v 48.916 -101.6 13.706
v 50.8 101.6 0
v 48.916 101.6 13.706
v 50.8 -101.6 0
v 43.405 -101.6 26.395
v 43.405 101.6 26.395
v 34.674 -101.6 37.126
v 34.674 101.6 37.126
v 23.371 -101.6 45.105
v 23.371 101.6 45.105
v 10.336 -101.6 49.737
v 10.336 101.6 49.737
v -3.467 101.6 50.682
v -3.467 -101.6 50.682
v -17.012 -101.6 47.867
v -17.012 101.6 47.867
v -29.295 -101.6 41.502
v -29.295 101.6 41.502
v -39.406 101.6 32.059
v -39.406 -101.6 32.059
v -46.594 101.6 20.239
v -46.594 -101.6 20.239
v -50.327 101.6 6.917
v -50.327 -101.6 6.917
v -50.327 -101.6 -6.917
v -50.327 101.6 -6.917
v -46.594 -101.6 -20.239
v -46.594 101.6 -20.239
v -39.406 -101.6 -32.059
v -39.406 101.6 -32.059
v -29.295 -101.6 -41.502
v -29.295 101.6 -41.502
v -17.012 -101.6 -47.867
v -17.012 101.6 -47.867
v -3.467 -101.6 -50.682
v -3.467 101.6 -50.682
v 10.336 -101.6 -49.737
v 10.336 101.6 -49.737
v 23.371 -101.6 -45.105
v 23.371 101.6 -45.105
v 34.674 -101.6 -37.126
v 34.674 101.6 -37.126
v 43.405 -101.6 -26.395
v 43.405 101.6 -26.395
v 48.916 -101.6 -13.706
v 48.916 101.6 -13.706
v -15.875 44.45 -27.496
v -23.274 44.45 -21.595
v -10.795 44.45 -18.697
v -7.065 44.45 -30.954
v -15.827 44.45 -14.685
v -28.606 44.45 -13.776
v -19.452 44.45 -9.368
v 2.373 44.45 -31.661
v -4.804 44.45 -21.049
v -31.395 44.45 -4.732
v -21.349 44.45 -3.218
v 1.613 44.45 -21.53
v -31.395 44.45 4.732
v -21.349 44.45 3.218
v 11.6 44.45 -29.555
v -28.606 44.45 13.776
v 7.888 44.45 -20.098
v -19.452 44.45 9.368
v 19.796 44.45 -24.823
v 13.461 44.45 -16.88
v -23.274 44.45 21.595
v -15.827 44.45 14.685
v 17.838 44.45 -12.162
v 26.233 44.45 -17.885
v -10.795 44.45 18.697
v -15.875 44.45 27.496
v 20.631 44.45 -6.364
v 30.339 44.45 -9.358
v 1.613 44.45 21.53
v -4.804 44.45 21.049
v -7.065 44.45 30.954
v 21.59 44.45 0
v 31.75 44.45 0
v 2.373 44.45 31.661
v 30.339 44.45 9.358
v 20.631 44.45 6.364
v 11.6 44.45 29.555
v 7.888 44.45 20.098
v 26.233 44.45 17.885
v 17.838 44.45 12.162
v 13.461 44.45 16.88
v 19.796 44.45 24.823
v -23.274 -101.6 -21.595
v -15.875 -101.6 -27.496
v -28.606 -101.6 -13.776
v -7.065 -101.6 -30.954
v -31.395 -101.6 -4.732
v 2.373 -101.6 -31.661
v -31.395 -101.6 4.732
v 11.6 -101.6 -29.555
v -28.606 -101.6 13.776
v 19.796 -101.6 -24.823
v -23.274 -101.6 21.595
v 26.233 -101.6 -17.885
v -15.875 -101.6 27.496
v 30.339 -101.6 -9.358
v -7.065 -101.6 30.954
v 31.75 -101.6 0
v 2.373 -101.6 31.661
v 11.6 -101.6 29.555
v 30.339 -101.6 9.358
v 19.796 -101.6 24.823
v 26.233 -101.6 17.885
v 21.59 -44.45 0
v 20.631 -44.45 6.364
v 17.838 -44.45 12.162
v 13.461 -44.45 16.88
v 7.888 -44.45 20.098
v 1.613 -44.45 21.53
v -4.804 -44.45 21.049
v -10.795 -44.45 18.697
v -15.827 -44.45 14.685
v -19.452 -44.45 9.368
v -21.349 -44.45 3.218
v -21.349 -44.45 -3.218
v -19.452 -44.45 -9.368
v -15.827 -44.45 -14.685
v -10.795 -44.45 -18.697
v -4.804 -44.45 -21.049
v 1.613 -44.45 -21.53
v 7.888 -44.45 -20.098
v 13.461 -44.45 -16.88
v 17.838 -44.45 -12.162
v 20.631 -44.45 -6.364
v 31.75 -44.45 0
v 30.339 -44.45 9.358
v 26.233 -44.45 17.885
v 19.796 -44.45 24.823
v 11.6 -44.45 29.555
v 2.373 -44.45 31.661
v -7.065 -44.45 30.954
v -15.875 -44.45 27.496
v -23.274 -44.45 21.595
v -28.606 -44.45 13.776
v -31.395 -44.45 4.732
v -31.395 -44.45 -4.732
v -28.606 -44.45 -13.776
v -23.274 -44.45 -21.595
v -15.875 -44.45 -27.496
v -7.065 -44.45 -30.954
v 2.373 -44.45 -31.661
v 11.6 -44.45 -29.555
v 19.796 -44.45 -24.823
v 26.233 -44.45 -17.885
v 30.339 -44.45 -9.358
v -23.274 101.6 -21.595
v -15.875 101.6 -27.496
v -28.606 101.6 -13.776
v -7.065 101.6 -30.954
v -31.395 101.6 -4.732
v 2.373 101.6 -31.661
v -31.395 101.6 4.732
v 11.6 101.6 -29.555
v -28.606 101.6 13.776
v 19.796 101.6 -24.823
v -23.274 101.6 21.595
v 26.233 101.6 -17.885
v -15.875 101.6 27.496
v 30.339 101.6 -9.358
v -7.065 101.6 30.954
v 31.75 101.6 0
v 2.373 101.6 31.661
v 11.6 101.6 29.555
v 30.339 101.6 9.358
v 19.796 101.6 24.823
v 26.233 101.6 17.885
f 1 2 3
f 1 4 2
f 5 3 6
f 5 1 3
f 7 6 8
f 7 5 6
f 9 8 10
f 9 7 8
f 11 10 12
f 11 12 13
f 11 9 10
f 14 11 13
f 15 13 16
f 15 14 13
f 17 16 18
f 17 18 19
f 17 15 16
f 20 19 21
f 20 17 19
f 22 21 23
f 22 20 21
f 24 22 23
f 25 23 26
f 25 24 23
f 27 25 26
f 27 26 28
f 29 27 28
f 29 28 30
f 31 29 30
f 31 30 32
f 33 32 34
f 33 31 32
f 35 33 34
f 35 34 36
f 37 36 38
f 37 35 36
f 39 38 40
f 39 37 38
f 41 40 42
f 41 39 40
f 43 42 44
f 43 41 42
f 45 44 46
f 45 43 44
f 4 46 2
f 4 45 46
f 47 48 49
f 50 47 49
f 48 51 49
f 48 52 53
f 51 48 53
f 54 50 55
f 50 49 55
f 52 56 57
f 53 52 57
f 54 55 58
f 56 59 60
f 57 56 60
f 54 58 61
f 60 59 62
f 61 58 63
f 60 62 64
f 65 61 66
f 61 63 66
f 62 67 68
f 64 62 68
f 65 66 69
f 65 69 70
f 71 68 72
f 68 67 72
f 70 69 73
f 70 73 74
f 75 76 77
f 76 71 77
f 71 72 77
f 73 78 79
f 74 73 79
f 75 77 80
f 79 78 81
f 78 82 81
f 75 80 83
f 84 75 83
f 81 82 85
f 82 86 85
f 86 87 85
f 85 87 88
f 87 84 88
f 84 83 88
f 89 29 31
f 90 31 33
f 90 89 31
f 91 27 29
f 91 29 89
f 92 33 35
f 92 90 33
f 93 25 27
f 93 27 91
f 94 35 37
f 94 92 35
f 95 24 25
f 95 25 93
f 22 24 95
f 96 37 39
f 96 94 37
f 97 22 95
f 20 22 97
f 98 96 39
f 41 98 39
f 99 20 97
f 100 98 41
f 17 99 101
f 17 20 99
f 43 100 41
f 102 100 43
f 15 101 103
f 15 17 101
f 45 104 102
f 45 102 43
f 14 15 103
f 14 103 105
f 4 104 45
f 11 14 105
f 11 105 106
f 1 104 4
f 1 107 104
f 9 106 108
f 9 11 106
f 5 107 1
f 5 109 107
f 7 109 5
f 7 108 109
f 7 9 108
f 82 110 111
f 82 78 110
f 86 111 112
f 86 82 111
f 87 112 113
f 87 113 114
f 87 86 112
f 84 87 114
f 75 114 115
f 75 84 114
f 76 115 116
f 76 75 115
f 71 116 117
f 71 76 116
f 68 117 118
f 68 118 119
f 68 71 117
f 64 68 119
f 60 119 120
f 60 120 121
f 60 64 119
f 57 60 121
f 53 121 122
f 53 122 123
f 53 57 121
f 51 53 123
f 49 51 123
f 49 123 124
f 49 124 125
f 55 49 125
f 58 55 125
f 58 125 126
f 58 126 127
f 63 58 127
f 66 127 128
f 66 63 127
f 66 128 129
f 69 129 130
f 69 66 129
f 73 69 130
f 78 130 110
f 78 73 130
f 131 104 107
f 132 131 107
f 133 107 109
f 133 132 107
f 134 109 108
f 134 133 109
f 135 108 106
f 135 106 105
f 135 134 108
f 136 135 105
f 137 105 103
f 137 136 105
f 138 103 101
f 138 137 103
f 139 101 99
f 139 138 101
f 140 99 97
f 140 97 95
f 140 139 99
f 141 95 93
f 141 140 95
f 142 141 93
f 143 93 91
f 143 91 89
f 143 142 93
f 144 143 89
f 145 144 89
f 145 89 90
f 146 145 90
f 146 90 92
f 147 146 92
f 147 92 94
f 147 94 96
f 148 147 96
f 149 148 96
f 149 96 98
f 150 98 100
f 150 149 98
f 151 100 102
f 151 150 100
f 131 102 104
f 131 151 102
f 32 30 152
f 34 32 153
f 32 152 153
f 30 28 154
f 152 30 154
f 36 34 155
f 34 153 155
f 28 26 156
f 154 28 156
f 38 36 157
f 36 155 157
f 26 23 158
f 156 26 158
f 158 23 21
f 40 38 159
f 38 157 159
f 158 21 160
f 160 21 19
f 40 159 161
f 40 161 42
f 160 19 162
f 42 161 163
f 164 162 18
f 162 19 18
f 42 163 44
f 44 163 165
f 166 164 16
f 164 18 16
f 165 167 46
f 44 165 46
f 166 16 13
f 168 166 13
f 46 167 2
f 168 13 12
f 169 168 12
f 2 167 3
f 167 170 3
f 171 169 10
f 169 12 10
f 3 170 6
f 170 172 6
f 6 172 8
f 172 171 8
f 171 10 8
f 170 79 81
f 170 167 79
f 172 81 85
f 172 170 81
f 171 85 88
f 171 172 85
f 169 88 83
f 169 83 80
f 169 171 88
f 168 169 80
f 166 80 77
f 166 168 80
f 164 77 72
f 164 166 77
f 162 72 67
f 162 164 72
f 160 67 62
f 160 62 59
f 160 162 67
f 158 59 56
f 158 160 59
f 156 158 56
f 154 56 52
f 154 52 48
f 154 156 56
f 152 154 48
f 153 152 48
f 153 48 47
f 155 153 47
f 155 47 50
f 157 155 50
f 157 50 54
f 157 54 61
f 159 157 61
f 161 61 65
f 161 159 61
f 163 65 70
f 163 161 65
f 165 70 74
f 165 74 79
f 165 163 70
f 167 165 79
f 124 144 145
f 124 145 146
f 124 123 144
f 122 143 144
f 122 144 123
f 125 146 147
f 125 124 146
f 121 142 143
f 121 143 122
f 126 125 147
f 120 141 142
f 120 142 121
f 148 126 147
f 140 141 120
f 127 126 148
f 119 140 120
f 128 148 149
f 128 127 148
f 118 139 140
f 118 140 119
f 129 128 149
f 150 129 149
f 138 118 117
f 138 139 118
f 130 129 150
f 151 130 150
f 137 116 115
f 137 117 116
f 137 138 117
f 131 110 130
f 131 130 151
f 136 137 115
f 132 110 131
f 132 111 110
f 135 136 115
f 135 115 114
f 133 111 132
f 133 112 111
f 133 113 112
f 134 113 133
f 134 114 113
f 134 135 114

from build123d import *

# Parameters (mm, degrees)
F2_R     = 31.75
F2_R_2   = 21.59
F3_DEPTH = 44.45
F2_R_3   = 50.8
F4_DEPTH = 101.6


# Not quite as in the source:
# - a variable given as a bare number and used for a length is read in inches; the dataset says mm whatever the document's units were


with BuildPart() as f3:
    # F2 (on Front) → F3 (new body, symmetric)
    with BuildSketch(Plane.XZ):
        Circle(F2_R)
        Circle(F2_R_2, mode=Mode.SUBTRACT)
    extrude(amount=F3_DEPTH, both=True)

    # F2 (on Front) → F4 (join, symmetric)
    with BuildSketch(Plane.XZ):
        Circle(F2_R_3)
        Circle(F2_R, mode=Mode.SUBTRACT)
    extrude(amount=F4_DEPTH, both=True)


solid = f3.part
